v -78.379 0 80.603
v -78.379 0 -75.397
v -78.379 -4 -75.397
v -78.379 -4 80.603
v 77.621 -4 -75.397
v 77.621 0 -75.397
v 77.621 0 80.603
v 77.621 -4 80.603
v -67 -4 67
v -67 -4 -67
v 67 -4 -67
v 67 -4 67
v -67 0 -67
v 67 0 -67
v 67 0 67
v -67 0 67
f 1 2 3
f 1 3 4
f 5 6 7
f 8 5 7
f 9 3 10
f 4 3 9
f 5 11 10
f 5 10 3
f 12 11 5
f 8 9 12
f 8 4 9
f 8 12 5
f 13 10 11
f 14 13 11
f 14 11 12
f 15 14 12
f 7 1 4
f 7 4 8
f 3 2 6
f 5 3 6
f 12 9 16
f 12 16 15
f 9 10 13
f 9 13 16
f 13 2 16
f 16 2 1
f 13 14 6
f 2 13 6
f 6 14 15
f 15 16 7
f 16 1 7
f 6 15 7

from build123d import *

# Parameters (mm, degrees)
F0_W     = 156
F0_H     = 156
F1_DEPTH = 4
F2_W     = 134
F2_H     = 134
F3_DEPTH = 4


with BuildPart() as f1:
    # F0 (on Front) → F1 (new body)
    with BuildSketch(Plane.XZ):
        with Locations((-0.379207, 2.60339)):
            Rectangle(F0_W, F0_H)
    extrude(amount=F1_DEPTH)

    # F2 (on face) → F3 (cut)
    with BuildSketch(Plane.XZ.offset(4)):
        Rectangle(F2_W, F2_H)
    extrude(amount=-F3_DEPTH, mode=Mode.SUBTRACT)


solid = f1.part
